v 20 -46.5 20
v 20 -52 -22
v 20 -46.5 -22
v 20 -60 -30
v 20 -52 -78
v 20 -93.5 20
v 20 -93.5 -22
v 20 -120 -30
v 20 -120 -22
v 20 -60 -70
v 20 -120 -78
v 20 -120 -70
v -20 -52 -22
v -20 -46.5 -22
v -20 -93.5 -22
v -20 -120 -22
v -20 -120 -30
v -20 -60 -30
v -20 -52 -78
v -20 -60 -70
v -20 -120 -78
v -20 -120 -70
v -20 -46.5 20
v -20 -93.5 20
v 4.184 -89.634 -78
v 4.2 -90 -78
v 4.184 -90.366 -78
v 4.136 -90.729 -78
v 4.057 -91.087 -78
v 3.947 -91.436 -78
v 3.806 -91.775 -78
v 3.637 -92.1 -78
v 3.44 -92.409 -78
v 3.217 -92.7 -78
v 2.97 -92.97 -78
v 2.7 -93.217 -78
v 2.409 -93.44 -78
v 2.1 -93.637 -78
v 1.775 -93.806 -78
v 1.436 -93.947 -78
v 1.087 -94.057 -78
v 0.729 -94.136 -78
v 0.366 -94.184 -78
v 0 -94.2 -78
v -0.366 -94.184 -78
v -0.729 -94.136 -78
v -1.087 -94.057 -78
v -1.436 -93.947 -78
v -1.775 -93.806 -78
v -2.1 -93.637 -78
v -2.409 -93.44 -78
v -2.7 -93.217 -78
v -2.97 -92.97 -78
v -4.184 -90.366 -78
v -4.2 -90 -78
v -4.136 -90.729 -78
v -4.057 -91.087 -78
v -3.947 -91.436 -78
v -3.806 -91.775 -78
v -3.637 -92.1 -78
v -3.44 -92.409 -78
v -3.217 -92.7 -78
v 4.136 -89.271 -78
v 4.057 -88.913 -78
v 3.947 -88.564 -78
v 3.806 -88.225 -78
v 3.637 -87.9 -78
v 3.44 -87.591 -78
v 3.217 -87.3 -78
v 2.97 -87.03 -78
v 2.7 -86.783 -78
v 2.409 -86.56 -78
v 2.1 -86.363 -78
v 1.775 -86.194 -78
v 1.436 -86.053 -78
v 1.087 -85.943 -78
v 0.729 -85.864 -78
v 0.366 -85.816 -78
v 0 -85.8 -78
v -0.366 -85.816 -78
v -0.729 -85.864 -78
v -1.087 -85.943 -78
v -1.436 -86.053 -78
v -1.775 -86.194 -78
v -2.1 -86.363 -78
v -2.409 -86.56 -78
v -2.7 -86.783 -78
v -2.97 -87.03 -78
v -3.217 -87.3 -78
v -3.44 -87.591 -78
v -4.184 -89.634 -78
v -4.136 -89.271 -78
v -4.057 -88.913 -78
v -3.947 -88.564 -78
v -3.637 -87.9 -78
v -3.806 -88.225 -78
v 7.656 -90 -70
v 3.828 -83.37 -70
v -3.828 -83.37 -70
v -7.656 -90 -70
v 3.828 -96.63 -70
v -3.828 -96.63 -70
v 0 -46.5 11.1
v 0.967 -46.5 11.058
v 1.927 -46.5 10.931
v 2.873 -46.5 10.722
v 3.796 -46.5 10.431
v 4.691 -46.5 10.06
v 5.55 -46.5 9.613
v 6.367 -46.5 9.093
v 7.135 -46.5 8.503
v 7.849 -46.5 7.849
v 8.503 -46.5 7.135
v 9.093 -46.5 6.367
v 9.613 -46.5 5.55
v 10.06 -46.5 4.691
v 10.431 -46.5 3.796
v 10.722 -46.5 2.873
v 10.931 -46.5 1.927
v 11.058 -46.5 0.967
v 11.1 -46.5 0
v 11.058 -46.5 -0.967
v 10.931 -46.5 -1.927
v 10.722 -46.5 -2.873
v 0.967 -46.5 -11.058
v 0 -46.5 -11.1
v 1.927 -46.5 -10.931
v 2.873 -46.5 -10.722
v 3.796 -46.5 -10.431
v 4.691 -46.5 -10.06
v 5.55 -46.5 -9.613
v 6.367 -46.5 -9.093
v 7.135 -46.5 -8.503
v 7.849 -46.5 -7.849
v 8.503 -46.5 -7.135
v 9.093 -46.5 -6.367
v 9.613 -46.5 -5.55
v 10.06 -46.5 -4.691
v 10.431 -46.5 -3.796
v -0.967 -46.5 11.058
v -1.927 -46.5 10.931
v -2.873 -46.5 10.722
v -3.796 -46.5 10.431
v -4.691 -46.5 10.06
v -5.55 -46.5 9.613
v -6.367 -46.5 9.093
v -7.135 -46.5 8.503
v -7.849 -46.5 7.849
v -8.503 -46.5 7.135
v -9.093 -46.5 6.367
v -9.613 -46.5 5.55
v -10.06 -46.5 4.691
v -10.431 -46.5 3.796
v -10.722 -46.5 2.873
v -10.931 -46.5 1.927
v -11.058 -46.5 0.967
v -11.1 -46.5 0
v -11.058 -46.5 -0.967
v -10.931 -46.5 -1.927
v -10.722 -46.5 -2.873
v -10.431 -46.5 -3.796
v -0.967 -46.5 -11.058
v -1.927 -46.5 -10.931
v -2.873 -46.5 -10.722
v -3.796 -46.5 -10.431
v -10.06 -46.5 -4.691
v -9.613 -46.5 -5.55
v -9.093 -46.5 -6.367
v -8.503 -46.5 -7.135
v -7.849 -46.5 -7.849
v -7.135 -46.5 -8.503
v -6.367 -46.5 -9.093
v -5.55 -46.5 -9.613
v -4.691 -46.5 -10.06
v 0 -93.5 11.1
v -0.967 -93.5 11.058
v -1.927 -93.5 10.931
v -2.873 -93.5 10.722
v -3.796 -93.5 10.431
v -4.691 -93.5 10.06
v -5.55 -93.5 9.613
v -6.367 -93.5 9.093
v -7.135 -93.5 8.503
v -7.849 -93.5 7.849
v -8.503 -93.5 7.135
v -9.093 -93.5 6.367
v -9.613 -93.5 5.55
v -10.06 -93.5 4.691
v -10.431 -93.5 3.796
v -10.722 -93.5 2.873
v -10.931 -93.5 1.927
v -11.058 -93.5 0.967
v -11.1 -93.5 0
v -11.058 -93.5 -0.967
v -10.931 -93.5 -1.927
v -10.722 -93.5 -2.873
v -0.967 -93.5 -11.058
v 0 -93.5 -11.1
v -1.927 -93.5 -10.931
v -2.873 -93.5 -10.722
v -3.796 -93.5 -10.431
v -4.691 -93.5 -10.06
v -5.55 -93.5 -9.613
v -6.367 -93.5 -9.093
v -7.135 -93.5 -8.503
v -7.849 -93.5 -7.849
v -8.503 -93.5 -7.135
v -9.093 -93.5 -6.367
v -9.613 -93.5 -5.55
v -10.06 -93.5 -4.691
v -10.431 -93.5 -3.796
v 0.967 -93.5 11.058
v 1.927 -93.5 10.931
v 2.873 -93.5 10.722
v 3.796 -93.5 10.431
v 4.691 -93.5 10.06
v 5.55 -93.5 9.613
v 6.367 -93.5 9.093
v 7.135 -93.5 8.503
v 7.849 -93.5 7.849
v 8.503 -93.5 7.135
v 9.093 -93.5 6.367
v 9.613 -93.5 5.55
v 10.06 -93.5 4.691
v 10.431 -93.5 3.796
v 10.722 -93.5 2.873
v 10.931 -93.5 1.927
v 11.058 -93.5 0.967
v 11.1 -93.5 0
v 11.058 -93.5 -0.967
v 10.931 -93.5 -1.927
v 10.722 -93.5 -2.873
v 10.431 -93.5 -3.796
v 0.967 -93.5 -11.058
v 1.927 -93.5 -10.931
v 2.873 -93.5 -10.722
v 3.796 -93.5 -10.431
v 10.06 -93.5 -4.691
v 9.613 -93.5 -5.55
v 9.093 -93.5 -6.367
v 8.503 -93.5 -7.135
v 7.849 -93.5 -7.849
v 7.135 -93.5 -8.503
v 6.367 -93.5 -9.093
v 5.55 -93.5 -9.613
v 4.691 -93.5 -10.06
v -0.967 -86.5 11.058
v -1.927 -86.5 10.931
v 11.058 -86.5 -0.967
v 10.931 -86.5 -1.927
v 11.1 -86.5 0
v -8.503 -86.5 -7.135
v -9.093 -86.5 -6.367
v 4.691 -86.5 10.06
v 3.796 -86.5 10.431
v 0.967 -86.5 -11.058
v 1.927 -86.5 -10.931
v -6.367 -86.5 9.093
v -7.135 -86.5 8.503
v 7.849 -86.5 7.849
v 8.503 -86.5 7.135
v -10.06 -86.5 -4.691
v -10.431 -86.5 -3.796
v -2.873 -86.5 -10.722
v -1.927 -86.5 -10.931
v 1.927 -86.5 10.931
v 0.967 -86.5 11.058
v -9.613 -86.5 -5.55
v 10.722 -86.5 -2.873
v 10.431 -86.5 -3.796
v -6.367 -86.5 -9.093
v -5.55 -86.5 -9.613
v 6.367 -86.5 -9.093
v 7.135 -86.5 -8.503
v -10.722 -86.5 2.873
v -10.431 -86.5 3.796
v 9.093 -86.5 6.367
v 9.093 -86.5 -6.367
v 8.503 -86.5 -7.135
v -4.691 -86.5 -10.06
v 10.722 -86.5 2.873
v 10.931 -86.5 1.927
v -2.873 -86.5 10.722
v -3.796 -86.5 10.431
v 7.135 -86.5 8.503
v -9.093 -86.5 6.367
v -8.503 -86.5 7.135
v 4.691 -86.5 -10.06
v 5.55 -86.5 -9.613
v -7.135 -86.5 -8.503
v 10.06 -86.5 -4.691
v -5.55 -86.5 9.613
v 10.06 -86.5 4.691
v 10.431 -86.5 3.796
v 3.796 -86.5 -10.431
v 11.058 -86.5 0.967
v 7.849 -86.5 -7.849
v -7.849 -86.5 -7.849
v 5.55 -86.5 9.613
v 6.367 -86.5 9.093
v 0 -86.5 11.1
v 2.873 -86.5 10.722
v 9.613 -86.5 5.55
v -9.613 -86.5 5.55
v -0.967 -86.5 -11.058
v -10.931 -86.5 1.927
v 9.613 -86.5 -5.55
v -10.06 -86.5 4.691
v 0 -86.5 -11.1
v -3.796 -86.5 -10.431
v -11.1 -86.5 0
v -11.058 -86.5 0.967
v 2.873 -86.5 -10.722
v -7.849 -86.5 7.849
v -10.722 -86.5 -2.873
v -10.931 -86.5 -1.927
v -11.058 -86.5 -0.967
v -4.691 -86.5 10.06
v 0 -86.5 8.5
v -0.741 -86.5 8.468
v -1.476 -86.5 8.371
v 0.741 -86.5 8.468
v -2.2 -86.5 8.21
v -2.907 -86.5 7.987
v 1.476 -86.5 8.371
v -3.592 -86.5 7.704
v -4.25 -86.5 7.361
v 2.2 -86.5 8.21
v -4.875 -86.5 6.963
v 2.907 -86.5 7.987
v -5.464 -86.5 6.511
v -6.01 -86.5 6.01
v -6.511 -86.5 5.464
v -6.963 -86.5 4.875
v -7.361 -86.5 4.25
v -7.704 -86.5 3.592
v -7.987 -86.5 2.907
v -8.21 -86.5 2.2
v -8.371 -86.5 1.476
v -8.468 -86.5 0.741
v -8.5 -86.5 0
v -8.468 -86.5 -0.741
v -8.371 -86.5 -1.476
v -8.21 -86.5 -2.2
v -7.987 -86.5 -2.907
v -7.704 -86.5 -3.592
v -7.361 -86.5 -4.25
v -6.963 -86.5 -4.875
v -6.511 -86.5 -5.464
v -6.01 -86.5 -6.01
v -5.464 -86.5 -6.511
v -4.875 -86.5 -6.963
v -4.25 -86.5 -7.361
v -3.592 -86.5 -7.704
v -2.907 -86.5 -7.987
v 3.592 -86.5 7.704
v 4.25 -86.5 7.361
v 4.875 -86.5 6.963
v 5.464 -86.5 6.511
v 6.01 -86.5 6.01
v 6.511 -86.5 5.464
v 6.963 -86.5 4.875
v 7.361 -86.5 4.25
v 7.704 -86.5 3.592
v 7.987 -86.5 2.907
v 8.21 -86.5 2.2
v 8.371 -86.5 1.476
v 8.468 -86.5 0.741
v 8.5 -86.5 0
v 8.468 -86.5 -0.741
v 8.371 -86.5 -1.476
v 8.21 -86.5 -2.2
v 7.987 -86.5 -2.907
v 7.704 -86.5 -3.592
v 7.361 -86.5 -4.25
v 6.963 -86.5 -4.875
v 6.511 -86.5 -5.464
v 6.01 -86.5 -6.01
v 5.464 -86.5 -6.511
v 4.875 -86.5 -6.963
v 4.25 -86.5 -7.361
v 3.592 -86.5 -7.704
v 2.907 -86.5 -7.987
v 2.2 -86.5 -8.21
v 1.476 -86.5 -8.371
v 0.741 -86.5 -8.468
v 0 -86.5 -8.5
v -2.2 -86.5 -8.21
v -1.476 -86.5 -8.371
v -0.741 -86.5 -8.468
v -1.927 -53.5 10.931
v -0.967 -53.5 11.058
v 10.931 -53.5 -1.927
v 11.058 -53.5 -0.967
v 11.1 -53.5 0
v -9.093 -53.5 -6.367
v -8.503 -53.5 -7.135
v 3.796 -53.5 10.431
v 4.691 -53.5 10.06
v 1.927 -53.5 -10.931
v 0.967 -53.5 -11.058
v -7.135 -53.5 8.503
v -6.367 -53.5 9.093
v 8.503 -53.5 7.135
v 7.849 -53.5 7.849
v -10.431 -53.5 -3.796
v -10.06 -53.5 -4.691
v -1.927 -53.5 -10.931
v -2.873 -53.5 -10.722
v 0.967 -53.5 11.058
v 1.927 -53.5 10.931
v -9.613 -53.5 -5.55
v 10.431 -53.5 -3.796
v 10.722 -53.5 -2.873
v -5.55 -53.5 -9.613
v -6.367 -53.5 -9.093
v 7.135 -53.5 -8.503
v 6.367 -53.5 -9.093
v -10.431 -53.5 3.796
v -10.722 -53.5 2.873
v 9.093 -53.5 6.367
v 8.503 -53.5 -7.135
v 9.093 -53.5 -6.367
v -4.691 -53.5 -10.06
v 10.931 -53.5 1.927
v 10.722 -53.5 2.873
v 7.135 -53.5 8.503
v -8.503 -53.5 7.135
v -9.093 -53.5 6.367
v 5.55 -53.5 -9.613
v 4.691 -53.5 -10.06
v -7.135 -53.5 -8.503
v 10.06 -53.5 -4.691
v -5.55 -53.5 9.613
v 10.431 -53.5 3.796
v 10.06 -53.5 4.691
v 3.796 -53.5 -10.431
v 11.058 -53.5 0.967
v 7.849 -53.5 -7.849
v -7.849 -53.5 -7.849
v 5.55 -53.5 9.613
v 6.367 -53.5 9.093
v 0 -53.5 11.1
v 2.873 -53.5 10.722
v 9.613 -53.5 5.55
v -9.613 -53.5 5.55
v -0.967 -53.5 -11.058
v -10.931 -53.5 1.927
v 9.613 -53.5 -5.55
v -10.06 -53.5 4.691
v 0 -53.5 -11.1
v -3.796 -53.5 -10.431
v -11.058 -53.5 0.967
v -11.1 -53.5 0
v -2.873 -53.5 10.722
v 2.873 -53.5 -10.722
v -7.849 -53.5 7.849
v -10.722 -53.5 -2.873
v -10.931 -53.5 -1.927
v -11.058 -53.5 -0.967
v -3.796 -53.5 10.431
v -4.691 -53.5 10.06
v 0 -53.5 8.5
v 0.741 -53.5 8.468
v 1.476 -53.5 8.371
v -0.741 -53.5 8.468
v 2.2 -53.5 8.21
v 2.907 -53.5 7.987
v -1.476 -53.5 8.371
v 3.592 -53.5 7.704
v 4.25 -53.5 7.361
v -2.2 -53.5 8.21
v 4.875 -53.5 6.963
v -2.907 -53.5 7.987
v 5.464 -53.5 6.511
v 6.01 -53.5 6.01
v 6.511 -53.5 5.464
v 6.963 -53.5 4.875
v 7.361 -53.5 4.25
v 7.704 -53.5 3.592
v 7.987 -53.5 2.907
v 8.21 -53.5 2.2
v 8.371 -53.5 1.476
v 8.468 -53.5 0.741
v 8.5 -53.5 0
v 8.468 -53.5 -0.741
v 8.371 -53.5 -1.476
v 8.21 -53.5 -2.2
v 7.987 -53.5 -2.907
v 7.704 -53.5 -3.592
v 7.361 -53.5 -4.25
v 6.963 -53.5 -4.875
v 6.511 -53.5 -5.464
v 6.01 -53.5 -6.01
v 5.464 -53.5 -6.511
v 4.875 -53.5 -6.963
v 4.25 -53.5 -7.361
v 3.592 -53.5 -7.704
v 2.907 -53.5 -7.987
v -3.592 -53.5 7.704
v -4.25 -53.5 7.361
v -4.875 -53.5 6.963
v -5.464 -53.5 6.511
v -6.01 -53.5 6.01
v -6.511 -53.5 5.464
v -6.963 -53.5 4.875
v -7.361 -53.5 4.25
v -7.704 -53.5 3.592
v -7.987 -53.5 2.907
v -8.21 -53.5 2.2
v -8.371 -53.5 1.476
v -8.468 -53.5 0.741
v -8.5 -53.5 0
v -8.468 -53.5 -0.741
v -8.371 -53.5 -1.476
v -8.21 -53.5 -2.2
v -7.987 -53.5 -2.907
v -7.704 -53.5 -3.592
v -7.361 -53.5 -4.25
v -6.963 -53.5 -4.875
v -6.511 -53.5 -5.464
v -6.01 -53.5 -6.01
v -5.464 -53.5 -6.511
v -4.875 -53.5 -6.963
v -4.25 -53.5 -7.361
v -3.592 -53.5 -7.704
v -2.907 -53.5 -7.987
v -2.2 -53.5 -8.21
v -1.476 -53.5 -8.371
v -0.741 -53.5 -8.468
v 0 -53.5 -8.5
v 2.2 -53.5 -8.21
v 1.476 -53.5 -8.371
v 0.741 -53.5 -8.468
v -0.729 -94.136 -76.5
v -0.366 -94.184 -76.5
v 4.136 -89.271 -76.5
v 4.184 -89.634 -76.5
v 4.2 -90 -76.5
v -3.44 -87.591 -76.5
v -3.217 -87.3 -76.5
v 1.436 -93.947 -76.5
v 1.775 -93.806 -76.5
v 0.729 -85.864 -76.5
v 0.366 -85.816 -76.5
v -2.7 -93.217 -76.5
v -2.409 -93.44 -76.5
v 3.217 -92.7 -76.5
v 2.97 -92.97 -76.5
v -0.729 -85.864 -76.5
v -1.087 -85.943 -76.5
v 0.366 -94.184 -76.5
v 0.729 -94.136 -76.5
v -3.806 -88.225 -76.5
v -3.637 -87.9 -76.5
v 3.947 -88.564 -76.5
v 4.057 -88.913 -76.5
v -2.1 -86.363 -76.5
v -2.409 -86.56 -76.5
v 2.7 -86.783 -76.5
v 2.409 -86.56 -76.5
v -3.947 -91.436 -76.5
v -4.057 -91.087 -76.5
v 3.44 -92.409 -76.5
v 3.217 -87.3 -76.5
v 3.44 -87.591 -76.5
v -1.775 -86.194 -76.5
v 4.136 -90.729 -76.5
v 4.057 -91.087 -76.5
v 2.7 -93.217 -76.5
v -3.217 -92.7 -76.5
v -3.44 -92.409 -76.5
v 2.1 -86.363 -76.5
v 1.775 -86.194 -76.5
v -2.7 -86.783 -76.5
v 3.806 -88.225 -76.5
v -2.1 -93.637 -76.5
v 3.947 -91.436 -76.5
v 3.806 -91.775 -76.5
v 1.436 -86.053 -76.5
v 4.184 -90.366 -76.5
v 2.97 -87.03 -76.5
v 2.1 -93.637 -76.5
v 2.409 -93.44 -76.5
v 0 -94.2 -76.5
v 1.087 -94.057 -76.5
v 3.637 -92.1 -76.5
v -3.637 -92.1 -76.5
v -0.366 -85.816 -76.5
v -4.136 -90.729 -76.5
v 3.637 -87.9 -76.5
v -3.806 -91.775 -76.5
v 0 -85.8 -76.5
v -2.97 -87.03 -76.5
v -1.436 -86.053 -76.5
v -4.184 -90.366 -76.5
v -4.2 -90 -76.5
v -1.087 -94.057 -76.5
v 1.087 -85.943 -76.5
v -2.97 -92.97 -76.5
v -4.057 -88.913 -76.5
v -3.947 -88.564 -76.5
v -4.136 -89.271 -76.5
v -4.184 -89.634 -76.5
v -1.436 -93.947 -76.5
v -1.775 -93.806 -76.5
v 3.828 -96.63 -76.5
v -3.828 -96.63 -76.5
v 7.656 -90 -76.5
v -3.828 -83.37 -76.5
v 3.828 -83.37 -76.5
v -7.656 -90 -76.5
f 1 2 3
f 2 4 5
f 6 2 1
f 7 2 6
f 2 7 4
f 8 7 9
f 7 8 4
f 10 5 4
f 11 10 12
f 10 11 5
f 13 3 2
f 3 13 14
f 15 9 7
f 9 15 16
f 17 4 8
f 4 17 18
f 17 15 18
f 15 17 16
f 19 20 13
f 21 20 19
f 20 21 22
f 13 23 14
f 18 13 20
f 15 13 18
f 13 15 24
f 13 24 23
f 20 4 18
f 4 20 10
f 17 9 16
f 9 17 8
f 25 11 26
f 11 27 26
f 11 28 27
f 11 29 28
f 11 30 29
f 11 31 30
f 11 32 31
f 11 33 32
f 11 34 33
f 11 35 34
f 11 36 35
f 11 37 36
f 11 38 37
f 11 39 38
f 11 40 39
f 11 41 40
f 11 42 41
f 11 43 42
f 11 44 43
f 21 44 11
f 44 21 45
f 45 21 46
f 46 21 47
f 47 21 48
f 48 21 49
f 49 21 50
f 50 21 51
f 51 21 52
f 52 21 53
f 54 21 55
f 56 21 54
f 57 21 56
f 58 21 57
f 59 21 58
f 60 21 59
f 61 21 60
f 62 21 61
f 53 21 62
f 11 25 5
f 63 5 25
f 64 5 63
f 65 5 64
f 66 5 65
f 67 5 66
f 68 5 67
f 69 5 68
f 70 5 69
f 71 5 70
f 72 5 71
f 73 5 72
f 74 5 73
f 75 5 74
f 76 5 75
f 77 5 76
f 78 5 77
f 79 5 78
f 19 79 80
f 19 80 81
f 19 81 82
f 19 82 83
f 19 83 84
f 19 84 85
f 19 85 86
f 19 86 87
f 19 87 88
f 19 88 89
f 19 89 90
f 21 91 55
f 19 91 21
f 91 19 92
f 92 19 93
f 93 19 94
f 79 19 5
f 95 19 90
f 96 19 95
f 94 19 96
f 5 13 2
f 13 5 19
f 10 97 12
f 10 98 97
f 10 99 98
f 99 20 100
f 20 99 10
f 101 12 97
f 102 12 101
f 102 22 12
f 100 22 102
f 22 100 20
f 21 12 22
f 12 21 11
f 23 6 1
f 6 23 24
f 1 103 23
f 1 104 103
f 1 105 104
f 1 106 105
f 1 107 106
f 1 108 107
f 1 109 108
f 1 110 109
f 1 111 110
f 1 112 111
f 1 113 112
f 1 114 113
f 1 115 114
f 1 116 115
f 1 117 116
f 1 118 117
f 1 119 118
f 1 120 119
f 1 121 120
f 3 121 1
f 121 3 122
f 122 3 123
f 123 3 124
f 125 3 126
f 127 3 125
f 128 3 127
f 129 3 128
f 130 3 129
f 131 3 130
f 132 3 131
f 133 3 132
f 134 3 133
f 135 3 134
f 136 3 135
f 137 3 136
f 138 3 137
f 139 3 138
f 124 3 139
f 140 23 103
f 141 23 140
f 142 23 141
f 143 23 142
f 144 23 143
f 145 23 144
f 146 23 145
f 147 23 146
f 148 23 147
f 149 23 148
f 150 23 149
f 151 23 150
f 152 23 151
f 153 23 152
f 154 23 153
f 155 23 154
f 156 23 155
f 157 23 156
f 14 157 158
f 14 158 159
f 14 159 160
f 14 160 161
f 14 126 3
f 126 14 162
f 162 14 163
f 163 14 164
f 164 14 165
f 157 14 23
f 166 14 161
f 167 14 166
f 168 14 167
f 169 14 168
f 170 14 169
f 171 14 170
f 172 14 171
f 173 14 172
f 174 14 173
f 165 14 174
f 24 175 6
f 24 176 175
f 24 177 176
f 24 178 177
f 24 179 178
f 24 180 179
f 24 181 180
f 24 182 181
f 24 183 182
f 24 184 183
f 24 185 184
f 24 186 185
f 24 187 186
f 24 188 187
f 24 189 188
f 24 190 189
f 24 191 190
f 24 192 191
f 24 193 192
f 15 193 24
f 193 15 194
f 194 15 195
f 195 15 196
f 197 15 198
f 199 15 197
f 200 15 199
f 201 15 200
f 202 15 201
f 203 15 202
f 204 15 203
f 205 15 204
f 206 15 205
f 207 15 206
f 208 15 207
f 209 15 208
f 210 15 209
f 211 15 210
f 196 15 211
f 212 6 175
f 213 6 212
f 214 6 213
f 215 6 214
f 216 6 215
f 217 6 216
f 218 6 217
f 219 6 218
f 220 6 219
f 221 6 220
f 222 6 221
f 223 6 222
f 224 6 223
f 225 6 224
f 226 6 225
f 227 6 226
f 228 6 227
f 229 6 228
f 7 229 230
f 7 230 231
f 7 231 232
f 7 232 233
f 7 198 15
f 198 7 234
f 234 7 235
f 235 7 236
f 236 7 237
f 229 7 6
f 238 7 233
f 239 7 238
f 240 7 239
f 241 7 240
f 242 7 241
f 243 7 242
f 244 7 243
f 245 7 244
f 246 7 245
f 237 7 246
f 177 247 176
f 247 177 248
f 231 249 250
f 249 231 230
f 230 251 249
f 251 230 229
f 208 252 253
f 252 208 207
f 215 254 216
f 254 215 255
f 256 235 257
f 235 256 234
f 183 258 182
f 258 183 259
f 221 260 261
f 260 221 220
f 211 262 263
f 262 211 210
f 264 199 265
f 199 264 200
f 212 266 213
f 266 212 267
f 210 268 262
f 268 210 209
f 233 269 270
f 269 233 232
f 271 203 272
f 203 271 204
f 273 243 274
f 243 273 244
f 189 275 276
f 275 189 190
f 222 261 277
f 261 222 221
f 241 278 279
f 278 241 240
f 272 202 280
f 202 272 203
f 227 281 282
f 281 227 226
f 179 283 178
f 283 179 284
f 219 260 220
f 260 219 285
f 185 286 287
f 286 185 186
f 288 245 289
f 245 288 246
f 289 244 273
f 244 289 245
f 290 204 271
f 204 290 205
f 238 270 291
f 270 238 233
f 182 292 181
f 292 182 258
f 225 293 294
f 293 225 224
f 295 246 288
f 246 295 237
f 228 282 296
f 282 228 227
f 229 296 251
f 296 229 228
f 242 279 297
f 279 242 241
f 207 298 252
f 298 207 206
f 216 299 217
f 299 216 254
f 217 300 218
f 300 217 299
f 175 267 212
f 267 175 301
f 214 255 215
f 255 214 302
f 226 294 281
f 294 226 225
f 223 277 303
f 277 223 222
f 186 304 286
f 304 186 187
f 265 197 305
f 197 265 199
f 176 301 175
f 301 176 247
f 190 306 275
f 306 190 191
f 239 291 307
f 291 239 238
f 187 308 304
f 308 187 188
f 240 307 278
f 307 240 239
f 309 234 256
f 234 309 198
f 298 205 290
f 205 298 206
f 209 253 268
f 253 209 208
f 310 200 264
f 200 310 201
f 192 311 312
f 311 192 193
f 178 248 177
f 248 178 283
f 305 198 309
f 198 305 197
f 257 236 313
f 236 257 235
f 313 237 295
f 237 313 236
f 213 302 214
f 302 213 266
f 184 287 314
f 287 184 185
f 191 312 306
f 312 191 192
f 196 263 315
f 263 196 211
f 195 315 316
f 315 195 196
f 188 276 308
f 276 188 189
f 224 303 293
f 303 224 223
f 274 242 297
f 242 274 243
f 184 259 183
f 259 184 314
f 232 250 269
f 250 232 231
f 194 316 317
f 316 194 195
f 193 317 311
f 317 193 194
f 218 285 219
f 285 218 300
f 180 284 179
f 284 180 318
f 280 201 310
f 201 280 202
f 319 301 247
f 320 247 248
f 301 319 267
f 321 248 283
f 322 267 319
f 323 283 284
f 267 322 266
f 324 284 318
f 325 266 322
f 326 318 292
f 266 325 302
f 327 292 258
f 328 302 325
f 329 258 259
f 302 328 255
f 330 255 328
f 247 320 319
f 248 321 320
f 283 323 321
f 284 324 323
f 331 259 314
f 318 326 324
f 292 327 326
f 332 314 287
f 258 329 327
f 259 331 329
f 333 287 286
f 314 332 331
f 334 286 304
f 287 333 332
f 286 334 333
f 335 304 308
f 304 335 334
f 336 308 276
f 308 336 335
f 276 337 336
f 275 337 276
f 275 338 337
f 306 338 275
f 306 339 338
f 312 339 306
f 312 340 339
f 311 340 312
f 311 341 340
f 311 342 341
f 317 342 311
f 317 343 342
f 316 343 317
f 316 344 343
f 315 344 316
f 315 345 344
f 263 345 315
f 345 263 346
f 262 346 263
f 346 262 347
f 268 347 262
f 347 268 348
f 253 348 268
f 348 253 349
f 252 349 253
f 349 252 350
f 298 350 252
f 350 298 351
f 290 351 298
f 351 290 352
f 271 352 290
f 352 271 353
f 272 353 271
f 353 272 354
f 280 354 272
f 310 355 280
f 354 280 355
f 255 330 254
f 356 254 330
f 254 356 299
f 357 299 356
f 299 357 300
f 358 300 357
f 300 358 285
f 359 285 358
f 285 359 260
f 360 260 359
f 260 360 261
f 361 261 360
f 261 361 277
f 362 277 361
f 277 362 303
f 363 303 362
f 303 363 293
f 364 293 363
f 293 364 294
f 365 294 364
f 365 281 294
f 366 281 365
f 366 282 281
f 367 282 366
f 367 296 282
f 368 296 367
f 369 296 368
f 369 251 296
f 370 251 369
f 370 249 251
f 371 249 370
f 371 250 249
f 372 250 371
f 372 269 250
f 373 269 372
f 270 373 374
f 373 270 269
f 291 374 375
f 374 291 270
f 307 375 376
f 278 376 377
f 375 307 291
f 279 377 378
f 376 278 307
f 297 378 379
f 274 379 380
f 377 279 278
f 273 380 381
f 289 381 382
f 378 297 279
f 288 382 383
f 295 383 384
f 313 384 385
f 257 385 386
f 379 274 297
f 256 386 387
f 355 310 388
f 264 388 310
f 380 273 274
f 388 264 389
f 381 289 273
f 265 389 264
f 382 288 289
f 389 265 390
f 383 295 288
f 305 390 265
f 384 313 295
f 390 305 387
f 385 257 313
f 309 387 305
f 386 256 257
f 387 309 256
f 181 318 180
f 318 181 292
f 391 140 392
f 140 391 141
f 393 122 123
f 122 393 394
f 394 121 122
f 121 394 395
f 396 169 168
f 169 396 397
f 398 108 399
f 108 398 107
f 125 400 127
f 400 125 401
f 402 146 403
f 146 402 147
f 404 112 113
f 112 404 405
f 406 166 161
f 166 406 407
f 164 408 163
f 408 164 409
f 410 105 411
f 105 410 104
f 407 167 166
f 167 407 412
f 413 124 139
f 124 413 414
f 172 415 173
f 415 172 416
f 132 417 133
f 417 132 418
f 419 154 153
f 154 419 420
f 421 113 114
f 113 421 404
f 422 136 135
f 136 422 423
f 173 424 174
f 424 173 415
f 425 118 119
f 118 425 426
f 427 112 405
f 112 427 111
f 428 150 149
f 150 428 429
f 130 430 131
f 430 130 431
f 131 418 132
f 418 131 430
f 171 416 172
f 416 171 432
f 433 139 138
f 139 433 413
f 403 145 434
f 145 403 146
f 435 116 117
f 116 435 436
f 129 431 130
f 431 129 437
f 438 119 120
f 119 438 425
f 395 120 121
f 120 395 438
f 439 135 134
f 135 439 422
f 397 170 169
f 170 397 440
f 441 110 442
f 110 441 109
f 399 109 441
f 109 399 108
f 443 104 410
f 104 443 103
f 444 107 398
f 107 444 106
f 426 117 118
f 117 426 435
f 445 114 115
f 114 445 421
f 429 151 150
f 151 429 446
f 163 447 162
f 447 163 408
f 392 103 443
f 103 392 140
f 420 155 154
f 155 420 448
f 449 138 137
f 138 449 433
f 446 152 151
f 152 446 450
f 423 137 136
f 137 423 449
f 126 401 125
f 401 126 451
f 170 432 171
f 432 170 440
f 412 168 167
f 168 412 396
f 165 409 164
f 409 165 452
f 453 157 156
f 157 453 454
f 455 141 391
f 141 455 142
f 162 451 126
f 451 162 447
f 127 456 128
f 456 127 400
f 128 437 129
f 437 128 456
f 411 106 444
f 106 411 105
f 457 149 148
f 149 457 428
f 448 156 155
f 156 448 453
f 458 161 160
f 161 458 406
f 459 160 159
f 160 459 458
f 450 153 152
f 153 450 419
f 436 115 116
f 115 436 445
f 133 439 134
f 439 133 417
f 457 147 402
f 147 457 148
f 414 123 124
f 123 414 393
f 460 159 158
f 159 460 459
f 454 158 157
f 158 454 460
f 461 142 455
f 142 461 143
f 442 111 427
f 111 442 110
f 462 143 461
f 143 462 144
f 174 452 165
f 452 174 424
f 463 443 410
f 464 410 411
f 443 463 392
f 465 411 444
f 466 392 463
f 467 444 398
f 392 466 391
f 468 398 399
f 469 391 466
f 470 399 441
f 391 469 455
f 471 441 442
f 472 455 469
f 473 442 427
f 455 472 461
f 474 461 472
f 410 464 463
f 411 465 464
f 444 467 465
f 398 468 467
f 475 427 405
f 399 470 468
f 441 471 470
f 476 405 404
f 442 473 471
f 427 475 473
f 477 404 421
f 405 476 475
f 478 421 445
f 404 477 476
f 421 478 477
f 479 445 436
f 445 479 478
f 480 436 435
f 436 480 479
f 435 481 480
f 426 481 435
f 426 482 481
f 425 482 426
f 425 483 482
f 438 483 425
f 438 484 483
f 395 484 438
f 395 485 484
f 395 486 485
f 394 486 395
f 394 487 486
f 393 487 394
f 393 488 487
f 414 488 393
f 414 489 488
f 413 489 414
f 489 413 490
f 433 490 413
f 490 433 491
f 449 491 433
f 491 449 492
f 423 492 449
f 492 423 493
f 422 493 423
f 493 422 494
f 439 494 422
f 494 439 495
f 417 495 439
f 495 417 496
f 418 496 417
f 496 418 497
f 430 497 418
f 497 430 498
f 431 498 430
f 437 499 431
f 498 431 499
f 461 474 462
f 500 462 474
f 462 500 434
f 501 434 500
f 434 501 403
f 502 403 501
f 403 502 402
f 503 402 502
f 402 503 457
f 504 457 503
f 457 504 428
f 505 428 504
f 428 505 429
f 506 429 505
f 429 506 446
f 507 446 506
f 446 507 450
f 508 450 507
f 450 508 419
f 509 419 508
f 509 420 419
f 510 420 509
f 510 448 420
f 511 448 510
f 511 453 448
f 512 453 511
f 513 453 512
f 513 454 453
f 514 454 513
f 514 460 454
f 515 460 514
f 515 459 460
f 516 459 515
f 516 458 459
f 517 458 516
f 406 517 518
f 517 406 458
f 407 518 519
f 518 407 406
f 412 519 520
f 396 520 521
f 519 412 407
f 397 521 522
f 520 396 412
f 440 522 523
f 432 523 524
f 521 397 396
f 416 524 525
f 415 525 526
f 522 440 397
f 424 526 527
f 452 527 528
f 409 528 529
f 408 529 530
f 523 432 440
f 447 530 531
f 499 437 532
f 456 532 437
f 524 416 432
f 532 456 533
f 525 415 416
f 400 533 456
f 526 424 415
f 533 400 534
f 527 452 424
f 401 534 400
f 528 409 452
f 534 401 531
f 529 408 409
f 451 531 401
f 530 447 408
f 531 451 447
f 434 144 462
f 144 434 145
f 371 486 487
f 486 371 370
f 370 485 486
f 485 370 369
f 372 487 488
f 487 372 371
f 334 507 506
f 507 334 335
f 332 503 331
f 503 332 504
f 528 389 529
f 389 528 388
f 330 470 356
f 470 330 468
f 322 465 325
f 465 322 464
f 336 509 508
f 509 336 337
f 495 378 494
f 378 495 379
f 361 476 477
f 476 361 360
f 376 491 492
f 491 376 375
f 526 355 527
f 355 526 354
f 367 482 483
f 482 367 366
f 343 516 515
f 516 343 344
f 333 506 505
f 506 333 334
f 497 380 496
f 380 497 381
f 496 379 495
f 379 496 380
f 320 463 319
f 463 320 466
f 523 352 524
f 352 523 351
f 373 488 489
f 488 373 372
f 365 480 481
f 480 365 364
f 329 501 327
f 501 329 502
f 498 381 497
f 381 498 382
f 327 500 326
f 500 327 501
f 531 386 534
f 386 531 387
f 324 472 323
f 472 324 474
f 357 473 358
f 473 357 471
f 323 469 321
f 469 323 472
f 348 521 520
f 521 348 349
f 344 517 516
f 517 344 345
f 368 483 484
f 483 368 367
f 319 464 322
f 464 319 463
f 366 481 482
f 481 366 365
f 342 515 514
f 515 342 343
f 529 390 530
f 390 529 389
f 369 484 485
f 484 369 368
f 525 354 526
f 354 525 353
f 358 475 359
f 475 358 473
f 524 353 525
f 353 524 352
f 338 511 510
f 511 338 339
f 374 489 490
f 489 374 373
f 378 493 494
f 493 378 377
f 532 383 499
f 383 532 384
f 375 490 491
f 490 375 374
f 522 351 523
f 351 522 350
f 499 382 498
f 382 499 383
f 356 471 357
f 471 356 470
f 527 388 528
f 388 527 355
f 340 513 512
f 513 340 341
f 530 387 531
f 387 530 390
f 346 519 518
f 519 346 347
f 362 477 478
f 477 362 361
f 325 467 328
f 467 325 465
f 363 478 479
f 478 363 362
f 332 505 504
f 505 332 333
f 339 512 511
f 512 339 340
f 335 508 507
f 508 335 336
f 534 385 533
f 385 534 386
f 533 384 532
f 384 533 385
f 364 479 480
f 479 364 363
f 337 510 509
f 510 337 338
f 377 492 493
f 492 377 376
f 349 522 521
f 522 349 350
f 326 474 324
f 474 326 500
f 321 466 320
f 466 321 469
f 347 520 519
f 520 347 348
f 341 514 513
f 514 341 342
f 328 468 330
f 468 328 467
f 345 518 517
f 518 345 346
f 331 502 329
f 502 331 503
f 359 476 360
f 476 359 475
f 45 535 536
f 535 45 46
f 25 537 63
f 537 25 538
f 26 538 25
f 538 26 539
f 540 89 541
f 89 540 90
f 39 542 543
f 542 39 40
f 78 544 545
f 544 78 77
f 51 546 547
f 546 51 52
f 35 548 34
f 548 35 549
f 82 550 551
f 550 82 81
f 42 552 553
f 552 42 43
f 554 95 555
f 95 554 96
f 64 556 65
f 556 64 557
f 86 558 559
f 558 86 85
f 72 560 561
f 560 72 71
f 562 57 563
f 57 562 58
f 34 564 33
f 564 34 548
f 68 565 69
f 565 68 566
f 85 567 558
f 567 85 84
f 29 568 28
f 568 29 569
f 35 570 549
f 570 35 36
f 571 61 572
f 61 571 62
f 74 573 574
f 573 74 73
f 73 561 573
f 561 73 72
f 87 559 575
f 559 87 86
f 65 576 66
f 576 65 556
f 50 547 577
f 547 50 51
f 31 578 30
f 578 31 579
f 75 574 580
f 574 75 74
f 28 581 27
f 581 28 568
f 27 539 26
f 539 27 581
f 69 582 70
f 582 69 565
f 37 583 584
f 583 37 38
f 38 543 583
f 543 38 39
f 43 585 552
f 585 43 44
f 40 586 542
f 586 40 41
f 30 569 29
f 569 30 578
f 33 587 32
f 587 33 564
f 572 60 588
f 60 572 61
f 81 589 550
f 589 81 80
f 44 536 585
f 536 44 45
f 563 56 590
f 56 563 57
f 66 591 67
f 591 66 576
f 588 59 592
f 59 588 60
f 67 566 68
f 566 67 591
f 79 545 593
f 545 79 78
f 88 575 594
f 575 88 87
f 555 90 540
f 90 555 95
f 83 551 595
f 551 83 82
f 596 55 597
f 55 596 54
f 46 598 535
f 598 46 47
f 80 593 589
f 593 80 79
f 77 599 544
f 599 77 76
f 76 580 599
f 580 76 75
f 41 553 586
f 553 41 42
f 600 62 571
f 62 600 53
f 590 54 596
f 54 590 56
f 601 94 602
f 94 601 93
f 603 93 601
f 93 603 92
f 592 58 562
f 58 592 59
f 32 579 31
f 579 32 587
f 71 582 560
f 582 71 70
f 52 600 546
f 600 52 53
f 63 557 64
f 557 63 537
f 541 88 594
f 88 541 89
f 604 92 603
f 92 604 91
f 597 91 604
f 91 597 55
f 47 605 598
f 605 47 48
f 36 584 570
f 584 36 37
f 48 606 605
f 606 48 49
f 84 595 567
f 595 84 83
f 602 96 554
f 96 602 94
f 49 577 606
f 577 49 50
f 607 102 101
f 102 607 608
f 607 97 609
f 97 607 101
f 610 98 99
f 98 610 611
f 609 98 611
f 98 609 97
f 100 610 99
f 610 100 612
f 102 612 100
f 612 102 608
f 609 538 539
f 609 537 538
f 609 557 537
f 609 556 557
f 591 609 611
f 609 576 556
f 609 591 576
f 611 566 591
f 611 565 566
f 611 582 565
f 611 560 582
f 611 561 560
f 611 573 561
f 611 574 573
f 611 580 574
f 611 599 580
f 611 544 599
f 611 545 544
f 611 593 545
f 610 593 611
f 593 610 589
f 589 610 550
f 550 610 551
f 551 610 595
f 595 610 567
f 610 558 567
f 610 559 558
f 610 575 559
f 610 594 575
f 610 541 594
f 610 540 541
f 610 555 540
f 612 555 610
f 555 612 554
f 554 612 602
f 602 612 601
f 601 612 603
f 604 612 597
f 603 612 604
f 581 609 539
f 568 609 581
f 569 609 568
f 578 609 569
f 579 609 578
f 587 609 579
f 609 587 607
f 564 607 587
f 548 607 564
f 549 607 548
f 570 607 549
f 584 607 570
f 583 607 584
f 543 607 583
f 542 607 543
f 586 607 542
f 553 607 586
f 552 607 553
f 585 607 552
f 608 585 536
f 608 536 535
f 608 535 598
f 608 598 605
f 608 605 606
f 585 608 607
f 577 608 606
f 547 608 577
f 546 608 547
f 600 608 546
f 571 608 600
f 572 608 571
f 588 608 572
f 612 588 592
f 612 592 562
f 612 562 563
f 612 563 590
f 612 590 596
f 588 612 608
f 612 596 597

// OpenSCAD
// file: params.scad
// All dimensions in mm, densities in g/mm^3. Source of truth: docs/hardware/cad-spec.md.
// Frame: origin at the axle centre on the rod mid-plane; Z up the upright rod;
// Y along the axle away from the table edge; X along the table edge.

bed = 220;
rho_pla = 1.25e-3;
rho_steel = 7.85e-3;

rod_len = 250;                 // axle axis to motor axis

// ---- wheel (native axis Z) ----
wheel_d = 280;
rim_radial = 8;
rim_axial = 8;
spokes = 8;                    // two per quadrant
spoke_w = 4;
spoke_t = 8;
hub_d = 60;
hub_t = 5;
hub_bc_d = 45;                 // quadrant flange screws
hub_bore_d = 10;
flange_ri = 13;                // quadrant flange sector inner radius (clears rotor screw heads)
pocket_n = 16;                 // tuning holes every 22.5 deg, first at 11.25 deg
bolt_fit = 8;                  // standard number of M6 tuning bolts
lap_len = 8;                   // rim half-lap length along the rim

// ---- motor mj5208 ----
motor_d = 63;
motor_len = 25;
rotor_bc_d = 17;
rotor_n = 3;
stator_pitch = 25;             // TO VERIFY against the mjbots 2D drawing (square assumed)
stator_n = 4;
flange_d = 70;
flange_plate_t = 6;

// ---- pivot ----
axle_d = 8;
axle_len = 120;
bearing_od = 22;
bearing_w = 7;
bearing_spacing = 40;
axle_overhang = 60;            // table edge to rod mid-plane
axle_height = 30;              // table top to axle centre
table_min = 18;
table_max = 40;

// ---- rod ----
beam_w = 20;                   // X
beam_h = 20;                   // Y
flange_t = 3;
web_t = 3;
tongue_len = 40;
beam_end = rod_len - 60;       // tongue ends here so the beam fits the bed diagonally
clamp_size = [30, 20, 30];     // X, Y, Z around the axle
battery = [35, 25, 75];        // X, Y, Z as mounted on the -Y face
hat = [49, 58];                // RPi/pi3hat hole pattern: X, Z
hat_hole = 2.8;

// ---- stand ----
jaw_w = 40;
clamp_wall = 8;
throat = 60;
arm_w = 40;

// ---- fits and hardware ----
clearance = 0.3;
M3 = 3.4;
M6 = 6.4;
M8 = 8.4;
nut_m3_af = 5.5;
nut_m3_h = 2.4;
nut_m8_af = 13;
nut_m8_h = 6.5;
$fn = 72;
// file: lib.scad
include <params.scad>

// Axis-aligned box from (x0,y0,z0) to (x1,y1,z1).
module plate(x0, x1, y0, y1, z0, z1) translate([x0, y0, z0]) cube([x1 - x0, y1 - y0, z1 - z0]);

// Ring sector between angles a0..a1 (deg), radii ri..ro, height h from z=0.
module arc(a0, a1, ro, ri, h) rotate([0, 0, a0]) rotate_extrude(angle = a1 - a0) translate([ri, 0]) square([ro - ri, h]);

// Children placed at n points on a circle of diameter d, first at angle start.
module at_circle(d, n, start = 0) for (i = [0 : n - 1]) rotate([0, 0, start + i * 360 / n]) translate([d / 2, 0, 0]) children();

// Through hole along Z spanning z in [-1, h+1].
module hole(d, h) translate([0, 0, -1]) cylinder(d = d, h = h + 2);

// Hex nut pocket, across-flats af, from z=0 up to h.
module hex_pocket(af, h) cylinder(d = af / cos(30) + clearance, h = h, $fn = 6);

// Cylinder along +Y starting at y0.
module ycyl(d, h, y0 = 0) translate([0, y0, 0]) rotate([-90, 0, 0]) cylinder(d = d, h = h);
// main file
// Table-edge C-clamp with a cantilever bearing arm. Native frame = pendulum frame.
include <lib.scad>

part = "stand";   // stand | pad

edge = -axle_overhang;                      // table edge plane (Y)
top = -axle_height;                         // table top plane (Z)
y_out = -(axle_overhang - 10);              // outboard bearing centre (-50)
y_in = y_out - bearing_spacing;             // inboard bearing centre (-90)
arm_y0 = y_in - bearing_w / 2;              // -93.5
arm_y1 = y_out + bearing_w / 2;             // -46.5
lower_jaw_z = top - table_max - clamp_wall; // -78

module stand() {
    difference() {
        union() {
            plate(-jaw_w / 2, jaw_w / 2, edge - throat, edge, top, top + clamp_wall);                  // top jaw
            plate(-jaw_w / 2, jaw_w / 2, edge, edge + clamp_wall, lower_jaw_z, top + clamp_wall);     // back
            plate(-jaw_w / 2, jaw_w / 2, edge - throat, edge, lower_jaw_z, lower_jaw_z + clamp_wall); // lower jaw
            plate(-arm_w / 2, arm_w / 2, arm_y0, arm_y1, top + clamp_wall, 20);                       // bearing arm
        }
        // bearing pockets from each end and the relief bore between them
        ycyl(bearing_od + 0.2, bearing_w + 1, arm_y0 - 1);
        ycyl(bearing_od + 0.2, bearing_w + 1, arm_y1 - bearing_w);
        ycyl(17, arm_y1 - arm_y0 + 2, arm_y0 - 1);
        // thumb screw through the lower jaw, nut pocket opening upward into the throat
        translate([0, edge - throat / 2, lower_jaw_z - 1]) cylinder(d = M8, h = clamp_wall + 2);
        translate([0, edge - throat / 2, lower_jaw_z + clamp_wall - nut_m8_h]) hex_pocket(nut_m8_af, nut_m8_h + 0.01);
    }
}

// Pressure pad for the thumb screw (own frame, prints flat).
module pad() {
    difference() {
        cylinder(d = 25, h = 6);
        translate([0, 0, 2]) cylinder(d = M8, h = 5);
    }
}

if (part == "stand") stand();
else if (part == "pad") pad();
else assert(false, str("unknown part: ", part));
